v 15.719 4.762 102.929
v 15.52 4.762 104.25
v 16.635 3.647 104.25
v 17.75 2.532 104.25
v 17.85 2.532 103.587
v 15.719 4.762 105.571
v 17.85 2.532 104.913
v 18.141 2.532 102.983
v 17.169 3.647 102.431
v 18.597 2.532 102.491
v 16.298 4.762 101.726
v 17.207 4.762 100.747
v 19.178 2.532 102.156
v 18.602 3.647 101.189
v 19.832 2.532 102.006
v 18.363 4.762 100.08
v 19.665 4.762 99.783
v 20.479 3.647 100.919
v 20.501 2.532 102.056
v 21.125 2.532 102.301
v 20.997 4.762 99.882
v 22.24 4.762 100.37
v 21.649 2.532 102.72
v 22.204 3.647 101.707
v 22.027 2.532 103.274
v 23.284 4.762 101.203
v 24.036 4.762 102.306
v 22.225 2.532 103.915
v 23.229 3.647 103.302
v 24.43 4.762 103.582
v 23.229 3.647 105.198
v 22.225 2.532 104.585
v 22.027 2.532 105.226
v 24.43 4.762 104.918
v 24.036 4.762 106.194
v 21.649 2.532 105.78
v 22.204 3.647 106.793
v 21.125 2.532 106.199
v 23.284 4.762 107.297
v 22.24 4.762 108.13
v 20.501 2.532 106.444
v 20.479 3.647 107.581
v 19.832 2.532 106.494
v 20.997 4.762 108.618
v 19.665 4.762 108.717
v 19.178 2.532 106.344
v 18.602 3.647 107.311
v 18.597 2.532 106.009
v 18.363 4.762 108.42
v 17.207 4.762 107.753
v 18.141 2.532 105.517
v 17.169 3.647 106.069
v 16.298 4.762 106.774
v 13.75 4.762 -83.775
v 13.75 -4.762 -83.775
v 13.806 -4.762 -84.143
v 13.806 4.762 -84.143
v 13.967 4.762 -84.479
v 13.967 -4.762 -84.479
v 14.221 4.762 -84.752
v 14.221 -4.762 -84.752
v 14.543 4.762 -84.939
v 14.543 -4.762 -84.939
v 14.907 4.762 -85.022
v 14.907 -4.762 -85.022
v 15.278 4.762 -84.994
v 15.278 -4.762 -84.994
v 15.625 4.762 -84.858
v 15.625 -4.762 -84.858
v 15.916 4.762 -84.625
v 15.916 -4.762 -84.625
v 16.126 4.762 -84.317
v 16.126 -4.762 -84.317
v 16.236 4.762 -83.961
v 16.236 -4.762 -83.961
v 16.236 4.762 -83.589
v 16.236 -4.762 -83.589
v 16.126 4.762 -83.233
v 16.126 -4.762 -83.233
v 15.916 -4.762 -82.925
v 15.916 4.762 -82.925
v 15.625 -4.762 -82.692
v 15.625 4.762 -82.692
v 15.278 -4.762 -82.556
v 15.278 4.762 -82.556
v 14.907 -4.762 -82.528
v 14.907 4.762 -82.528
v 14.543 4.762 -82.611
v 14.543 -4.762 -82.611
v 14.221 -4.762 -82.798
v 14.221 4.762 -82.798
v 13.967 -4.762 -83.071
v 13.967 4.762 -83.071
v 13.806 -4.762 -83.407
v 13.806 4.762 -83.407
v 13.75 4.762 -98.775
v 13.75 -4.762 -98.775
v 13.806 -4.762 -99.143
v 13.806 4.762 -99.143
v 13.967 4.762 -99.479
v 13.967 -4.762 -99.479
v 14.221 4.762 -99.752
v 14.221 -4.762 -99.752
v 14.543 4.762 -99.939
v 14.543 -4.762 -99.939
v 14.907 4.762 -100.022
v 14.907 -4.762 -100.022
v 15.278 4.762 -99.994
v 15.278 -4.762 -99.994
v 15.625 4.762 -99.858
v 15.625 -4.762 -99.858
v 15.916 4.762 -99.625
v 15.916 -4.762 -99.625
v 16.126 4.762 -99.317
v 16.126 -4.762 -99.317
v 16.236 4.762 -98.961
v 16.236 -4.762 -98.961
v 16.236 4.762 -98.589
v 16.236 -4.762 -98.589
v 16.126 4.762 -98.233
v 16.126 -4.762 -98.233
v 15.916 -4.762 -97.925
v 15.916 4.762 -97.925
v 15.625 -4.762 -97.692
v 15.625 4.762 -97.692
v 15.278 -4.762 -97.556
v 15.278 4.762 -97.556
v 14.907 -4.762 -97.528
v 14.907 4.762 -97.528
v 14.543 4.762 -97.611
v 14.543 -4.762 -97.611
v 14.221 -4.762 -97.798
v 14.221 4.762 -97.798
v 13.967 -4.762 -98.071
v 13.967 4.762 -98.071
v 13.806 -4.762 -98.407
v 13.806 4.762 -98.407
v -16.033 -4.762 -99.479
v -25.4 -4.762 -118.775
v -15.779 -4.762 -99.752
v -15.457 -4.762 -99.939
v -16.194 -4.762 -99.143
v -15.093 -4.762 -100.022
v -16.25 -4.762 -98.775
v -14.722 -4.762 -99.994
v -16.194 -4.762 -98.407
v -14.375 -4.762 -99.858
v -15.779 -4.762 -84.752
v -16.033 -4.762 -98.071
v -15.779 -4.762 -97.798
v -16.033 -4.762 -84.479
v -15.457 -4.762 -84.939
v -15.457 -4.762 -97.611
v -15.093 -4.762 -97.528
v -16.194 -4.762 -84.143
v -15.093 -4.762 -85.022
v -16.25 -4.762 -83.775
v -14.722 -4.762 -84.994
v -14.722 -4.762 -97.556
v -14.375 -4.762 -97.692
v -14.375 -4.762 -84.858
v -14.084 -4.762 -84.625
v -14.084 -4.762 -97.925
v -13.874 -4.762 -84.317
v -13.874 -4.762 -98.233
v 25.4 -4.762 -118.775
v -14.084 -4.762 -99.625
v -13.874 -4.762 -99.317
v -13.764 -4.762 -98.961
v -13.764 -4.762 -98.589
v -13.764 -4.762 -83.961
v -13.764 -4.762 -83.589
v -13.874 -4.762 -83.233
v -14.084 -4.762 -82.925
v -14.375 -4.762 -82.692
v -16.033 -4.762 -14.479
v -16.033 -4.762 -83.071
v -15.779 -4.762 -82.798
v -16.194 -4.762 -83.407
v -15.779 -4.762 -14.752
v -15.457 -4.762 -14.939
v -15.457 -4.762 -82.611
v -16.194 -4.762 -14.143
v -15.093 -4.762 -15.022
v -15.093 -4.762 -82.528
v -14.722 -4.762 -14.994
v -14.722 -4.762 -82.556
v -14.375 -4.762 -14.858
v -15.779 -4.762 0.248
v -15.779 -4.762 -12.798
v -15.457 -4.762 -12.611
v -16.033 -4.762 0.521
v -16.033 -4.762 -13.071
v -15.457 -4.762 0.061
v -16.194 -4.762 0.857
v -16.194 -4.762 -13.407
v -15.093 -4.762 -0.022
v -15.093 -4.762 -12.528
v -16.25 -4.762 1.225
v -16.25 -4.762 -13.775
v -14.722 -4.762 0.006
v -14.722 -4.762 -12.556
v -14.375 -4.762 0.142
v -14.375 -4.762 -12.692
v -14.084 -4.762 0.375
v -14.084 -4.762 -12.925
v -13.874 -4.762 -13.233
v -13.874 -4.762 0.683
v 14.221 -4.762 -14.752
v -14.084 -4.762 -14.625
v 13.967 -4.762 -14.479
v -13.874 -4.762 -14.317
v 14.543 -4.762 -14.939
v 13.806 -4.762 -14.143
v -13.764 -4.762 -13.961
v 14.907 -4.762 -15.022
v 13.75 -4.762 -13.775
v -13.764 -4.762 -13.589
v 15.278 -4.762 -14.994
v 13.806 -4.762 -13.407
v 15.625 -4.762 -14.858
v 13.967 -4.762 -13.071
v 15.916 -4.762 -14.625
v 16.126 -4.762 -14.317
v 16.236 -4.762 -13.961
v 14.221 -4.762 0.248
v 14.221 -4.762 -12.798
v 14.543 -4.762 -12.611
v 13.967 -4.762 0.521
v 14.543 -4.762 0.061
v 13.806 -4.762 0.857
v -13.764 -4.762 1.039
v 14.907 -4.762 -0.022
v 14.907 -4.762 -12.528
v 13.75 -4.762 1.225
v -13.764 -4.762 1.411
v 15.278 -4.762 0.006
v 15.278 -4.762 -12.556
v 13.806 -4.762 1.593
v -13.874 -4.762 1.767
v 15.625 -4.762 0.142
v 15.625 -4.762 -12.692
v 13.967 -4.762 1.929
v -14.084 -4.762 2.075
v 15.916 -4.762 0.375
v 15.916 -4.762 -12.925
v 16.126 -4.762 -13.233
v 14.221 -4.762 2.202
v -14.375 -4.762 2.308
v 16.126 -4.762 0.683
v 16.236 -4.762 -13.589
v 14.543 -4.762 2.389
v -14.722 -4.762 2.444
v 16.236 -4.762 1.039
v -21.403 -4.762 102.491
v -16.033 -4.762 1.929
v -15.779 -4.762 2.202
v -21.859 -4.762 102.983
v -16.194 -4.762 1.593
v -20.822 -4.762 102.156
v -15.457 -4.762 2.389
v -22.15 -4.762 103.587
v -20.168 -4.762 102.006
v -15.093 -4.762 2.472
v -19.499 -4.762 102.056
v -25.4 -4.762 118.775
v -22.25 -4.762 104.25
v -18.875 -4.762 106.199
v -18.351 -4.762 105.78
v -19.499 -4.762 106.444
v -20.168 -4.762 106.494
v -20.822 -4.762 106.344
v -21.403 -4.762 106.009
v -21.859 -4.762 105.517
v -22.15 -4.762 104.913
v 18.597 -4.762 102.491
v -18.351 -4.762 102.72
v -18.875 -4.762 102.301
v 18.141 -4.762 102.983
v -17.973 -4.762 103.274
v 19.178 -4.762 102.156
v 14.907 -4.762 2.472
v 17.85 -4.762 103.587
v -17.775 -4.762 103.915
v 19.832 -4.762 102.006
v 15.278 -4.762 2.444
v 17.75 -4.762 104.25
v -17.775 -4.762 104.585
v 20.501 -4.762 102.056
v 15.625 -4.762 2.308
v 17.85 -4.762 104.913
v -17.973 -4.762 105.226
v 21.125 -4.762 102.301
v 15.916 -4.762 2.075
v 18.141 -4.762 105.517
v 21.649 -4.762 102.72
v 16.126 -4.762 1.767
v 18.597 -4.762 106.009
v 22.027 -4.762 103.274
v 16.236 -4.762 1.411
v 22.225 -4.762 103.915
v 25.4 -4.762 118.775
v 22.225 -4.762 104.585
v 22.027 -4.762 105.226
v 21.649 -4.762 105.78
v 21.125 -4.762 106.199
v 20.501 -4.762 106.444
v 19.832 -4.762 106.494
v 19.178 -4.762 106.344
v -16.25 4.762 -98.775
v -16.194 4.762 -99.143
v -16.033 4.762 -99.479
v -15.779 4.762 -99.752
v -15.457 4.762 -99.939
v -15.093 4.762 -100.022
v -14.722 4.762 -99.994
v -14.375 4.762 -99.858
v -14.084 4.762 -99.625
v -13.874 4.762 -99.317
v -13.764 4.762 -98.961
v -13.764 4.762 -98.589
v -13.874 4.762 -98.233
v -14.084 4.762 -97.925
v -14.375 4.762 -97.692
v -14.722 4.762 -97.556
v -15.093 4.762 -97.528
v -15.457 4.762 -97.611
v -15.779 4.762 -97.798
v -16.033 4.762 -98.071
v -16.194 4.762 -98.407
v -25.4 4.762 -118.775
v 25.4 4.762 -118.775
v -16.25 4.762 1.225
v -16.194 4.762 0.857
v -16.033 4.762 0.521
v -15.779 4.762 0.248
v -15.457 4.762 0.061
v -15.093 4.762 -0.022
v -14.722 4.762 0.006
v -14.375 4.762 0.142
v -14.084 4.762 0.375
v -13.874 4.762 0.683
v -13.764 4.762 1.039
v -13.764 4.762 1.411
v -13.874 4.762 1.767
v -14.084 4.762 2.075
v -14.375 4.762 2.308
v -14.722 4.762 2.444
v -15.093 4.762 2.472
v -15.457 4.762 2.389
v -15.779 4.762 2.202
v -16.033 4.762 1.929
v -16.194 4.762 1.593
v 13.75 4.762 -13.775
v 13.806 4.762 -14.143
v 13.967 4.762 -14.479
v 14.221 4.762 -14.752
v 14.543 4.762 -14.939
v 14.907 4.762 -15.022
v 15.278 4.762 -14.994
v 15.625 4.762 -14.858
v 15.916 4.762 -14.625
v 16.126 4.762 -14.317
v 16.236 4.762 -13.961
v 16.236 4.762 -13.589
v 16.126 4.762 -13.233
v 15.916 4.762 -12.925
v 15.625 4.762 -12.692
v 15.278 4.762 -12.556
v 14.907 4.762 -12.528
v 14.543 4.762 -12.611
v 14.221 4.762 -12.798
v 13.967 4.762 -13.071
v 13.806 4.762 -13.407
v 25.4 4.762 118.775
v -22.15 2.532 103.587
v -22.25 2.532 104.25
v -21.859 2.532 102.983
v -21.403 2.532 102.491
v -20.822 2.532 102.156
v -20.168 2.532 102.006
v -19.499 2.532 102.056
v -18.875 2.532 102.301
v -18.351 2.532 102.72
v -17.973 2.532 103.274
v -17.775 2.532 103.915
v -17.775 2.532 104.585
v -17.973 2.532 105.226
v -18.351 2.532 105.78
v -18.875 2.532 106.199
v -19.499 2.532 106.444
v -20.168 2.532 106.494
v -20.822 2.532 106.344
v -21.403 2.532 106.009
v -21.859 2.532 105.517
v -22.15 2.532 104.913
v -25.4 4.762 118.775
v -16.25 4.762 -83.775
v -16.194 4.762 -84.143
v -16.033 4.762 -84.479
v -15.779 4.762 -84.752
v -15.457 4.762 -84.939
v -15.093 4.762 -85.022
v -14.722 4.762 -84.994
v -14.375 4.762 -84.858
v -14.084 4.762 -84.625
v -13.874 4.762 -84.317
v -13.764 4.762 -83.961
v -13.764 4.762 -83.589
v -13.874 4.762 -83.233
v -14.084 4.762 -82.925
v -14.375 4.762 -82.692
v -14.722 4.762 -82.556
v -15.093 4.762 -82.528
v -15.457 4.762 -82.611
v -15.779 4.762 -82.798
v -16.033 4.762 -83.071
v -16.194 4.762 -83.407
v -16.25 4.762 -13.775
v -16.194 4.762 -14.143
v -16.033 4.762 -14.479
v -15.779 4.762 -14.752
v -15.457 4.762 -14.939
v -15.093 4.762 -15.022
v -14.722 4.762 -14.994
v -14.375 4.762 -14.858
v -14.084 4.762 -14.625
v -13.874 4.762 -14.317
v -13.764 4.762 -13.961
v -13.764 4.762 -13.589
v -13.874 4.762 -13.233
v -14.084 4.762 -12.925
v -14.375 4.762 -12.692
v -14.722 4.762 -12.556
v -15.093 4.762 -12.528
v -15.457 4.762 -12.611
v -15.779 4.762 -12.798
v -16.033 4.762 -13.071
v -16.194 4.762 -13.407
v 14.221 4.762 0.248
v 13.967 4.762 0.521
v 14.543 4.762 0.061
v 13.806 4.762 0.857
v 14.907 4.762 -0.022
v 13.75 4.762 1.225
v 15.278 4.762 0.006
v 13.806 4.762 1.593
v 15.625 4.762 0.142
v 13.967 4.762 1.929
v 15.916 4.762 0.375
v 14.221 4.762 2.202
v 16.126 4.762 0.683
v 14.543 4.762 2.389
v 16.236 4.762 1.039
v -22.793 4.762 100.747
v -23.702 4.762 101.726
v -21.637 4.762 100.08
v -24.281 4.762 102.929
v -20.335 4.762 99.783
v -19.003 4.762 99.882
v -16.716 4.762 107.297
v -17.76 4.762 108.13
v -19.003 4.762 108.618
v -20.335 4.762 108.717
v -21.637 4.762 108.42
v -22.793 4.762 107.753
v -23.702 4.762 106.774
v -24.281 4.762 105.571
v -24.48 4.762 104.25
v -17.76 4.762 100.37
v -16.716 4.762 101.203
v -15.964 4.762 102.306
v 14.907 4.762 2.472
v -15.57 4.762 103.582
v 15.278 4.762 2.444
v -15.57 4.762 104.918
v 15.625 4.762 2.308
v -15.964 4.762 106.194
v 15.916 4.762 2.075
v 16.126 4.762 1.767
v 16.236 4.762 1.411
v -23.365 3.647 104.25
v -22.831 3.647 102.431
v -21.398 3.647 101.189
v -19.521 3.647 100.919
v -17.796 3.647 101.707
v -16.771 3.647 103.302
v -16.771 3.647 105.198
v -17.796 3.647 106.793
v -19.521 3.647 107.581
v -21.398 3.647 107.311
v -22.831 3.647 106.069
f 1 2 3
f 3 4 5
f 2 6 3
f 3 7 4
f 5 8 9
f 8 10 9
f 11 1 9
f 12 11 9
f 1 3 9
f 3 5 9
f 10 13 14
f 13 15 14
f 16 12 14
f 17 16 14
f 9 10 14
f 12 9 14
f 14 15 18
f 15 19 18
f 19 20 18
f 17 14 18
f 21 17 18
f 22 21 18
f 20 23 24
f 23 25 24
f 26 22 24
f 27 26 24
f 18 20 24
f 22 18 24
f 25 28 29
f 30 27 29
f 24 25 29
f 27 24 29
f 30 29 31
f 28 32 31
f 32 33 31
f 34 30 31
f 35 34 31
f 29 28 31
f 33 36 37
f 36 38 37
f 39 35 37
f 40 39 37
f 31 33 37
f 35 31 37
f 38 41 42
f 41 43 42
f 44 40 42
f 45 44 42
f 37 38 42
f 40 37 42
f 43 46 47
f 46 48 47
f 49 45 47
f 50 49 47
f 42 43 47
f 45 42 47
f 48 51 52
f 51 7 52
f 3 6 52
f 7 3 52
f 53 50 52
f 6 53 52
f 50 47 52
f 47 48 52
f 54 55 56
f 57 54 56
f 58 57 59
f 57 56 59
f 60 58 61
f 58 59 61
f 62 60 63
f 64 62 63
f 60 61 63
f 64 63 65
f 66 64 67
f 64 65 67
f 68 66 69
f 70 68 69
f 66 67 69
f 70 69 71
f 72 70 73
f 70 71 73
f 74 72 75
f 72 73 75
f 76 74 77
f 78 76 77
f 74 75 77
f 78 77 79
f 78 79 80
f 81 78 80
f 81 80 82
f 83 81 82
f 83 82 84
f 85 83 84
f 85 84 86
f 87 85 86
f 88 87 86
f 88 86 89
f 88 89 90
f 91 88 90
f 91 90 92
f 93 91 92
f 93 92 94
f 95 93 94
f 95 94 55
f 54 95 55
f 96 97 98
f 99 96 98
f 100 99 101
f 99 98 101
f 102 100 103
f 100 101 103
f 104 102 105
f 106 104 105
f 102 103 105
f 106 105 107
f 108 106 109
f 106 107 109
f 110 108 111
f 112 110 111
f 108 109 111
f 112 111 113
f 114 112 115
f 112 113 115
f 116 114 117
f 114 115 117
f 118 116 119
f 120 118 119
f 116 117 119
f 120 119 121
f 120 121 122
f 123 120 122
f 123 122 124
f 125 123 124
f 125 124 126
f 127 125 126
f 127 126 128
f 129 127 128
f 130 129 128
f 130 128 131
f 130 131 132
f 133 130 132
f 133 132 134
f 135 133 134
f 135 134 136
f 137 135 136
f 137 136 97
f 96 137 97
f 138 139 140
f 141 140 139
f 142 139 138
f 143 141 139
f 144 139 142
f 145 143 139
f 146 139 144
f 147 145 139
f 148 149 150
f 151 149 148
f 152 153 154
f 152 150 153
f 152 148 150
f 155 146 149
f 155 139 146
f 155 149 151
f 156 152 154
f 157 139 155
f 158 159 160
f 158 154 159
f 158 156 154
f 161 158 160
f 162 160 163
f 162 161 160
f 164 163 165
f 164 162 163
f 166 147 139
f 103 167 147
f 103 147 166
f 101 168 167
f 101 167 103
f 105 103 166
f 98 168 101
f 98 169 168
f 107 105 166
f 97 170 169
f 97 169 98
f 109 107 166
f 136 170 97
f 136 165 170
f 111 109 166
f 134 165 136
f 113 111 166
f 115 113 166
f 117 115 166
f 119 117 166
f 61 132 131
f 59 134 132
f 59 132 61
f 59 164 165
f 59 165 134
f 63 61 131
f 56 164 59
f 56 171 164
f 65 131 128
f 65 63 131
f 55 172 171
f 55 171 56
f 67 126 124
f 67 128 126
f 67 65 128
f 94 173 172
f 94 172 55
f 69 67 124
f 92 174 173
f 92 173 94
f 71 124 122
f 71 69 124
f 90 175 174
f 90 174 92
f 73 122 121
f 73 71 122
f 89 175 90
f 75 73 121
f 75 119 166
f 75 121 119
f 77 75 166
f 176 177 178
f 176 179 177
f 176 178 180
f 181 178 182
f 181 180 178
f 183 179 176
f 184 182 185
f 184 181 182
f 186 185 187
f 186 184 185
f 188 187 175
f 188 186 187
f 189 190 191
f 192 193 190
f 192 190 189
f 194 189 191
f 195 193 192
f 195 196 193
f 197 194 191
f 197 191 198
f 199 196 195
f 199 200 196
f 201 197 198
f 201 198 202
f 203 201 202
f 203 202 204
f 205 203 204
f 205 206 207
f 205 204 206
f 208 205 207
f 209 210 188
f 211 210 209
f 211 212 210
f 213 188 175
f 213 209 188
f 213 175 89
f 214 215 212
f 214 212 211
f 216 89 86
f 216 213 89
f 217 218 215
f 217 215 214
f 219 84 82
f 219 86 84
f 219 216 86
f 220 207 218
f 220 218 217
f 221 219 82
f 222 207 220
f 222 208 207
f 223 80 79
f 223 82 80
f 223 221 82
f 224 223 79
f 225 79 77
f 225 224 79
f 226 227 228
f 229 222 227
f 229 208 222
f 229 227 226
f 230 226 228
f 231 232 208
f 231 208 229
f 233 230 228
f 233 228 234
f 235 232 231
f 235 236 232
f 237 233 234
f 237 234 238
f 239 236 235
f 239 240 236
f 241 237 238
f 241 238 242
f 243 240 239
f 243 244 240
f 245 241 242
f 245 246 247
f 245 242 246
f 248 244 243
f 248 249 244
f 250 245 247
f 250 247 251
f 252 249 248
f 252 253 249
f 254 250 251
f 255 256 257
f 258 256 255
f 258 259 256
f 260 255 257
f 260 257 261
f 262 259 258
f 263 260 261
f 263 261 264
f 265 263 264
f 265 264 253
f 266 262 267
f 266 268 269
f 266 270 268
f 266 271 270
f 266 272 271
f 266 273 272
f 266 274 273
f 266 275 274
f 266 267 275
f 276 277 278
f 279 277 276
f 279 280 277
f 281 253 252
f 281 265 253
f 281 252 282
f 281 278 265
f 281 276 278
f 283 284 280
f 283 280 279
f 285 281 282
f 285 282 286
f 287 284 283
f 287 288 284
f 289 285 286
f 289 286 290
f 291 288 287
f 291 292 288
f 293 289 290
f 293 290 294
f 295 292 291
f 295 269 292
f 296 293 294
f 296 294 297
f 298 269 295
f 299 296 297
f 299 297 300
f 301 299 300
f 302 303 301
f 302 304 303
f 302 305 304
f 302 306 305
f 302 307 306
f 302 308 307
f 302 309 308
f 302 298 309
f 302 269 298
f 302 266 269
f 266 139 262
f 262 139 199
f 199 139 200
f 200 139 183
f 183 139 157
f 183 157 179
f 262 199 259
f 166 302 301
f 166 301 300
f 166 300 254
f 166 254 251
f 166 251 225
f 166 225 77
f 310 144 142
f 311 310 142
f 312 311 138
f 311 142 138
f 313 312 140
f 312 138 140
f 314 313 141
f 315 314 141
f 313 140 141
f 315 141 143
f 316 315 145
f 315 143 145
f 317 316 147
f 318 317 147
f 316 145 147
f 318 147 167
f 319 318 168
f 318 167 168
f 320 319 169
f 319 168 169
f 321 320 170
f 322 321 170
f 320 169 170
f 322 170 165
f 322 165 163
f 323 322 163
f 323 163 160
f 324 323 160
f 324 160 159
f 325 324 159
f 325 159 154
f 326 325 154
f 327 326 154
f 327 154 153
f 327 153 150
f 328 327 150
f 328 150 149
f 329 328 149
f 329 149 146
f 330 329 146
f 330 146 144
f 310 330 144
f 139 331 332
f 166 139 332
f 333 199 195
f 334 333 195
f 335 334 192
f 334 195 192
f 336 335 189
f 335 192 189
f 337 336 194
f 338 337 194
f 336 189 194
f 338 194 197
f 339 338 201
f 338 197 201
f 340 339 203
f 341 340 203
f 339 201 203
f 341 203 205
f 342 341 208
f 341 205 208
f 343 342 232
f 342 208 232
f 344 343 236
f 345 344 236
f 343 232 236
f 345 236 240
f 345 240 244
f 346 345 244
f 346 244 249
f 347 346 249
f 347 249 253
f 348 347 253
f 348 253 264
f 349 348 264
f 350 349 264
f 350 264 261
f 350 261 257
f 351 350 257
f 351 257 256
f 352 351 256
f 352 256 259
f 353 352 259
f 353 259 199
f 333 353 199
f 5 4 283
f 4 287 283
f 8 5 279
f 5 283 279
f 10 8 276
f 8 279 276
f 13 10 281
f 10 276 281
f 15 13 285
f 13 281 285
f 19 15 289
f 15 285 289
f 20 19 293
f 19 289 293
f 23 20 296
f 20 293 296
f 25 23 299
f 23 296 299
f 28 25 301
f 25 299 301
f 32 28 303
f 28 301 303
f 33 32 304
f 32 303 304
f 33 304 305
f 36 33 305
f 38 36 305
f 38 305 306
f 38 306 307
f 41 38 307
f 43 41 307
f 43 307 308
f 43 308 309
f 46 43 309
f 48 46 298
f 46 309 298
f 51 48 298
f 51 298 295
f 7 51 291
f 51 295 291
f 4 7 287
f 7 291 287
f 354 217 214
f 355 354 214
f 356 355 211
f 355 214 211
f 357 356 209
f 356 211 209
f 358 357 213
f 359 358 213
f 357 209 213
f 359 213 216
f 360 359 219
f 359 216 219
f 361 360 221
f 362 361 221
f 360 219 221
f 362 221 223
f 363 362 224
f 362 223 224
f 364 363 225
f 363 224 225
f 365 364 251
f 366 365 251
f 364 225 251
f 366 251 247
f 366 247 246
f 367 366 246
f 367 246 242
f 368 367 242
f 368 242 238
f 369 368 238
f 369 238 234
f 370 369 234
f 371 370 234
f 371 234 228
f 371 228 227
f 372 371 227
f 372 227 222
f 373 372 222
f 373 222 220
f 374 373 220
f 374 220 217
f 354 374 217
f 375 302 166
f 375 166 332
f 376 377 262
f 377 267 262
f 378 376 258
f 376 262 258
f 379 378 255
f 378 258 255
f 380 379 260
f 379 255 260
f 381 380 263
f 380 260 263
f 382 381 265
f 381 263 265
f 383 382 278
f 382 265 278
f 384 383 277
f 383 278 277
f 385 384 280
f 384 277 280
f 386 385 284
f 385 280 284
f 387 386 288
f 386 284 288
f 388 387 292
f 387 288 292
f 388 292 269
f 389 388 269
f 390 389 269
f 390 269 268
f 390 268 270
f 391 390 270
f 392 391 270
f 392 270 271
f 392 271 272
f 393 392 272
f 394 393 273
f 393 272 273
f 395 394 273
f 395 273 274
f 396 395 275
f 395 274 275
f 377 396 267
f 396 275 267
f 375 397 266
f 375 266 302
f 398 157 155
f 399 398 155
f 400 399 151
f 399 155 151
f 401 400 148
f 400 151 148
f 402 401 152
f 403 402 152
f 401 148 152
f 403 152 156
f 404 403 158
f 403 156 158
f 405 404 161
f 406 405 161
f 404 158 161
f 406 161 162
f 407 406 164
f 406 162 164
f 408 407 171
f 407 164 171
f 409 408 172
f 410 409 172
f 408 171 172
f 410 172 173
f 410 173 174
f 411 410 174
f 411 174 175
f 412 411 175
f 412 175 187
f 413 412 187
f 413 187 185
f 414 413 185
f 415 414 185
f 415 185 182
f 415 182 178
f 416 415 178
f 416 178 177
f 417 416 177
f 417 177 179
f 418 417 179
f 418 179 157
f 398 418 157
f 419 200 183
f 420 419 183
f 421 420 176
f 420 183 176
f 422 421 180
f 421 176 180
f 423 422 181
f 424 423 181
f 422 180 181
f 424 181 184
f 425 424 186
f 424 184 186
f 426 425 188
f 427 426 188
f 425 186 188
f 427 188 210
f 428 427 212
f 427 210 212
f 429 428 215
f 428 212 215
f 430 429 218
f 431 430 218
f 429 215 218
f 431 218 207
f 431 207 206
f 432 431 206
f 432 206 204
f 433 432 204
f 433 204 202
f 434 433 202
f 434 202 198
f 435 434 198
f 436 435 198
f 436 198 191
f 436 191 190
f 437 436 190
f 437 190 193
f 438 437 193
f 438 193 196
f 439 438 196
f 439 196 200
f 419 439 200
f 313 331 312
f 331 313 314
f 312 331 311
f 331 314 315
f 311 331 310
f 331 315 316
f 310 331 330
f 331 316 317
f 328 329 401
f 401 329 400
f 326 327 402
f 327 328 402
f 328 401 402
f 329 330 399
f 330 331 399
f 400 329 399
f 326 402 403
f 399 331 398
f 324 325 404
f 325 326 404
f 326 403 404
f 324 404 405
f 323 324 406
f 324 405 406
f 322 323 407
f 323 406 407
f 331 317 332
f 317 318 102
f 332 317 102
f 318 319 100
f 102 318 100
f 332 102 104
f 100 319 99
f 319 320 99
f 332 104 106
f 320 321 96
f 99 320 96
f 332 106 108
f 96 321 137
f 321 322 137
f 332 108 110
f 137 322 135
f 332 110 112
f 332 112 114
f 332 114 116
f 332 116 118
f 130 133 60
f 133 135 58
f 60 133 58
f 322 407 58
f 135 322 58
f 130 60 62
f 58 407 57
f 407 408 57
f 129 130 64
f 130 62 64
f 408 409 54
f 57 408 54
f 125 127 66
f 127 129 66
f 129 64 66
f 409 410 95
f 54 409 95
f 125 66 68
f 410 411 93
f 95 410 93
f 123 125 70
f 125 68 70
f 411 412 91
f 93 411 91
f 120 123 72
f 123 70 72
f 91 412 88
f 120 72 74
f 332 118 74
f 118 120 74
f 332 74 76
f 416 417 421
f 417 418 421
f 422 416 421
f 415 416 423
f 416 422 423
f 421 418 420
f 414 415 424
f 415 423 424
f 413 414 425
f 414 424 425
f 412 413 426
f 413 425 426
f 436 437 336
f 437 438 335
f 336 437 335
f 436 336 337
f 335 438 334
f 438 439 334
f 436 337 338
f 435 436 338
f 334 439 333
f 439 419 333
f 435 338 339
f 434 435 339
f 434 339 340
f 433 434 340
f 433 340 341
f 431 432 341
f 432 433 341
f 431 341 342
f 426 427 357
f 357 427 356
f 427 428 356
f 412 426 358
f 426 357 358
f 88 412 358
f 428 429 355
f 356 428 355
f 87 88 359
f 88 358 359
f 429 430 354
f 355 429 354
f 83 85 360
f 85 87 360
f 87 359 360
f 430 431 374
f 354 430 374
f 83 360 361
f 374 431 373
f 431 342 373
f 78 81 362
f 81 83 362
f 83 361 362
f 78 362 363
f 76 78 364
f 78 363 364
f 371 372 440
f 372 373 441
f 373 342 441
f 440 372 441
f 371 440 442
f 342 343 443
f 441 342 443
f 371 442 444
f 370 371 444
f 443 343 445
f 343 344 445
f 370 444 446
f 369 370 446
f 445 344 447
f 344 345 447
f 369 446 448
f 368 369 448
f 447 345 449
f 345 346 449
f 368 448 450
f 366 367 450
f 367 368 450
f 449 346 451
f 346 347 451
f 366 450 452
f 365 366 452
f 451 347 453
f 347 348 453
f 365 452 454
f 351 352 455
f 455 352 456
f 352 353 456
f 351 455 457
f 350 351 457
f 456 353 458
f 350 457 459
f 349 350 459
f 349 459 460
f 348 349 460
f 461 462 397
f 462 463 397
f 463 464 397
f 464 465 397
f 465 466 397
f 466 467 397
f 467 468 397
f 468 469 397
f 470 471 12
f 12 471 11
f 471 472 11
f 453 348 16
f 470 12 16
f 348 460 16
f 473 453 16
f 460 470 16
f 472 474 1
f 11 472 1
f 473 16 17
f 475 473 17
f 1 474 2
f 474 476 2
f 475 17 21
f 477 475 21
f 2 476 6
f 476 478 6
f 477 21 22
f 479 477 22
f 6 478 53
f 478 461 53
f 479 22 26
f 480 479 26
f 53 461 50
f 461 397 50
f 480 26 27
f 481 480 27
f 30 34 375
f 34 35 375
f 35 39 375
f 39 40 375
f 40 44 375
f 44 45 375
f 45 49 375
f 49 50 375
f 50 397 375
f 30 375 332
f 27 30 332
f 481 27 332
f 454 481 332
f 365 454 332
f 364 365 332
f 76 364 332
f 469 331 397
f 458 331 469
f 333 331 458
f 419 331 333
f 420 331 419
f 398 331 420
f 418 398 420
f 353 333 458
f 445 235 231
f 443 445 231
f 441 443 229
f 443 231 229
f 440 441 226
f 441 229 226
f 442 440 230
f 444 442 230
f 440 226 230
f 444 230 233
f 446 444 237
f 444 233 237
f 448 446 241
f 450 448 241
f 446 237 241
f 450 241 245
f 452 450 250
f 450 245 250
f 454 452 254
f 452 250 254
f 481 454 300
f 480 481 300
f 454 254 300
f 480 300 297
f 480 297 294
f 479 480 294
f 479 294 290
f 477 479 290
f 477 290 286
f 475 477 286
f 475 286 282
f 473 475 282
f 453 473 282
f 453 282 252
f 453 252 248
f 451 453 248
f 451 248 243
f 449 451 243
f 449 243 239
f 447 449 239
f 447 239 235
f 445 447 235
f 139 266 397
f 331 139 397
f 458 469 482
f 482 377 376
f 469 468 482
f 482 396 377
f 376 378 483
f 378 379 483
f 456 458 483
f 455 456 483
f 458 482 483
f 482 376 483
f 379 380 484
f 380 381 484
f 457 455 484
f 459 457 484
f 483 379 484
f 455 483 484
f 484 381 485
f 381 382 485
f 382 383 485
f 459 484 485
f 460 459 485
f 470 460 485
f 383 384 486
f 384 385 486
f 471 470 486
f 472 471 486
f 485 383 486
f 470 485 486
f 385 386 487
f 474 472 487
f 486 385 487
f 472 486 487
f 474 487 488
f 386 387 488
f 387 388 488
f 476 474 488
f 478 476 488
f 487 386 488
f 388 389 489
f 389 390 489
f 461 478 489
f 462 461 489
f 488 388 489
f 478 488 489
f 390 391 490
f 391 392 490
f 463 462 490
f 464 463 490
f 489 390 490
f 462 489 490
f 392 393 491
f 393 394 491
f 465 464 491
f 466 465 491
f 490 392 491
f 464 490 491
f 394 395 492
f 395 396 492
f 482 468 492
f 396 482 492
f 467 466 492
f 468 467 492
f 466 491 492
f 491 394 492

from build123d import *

# Parameters (mm, degrees)
SKETCH1_W                     = 50.8
SKETCH1_H                     = 9.525
BOSS_EXTRUDE1_DEPTH           = 118.775
TAP_DRILL_FOR_M3X0_5_TAP1_D   = 2.5
CSK_FOR_M4_SFHCS1_D           = 4.5
CSK_FOR_M4_SFHCS1_CSINK_D     = 8.96
CSK_FOR_M4_SFHCS1_CSINK_ANGLE = 90


with BuildPart() as part:
    # Sketch1 → Boss-Extrude1 (new, symmetric)
    with BuildSketch(Plane.XY):
        Rectangle(SKETCH1_W, SKETCH1_H)
    extrude(amount=BOSS_EXTRUDE1_DEPTH, both=True)

    # Tap Drill for M3x0.5 Tap1 (through all)
    with Locations(Plane(origin=(0, 4.7625, 0), x_dir=(1, 0, 0), z_dir=(0, 1, 0))):
        with Locations((-15, 98.775), (15, 98.775), (-15, 83.775), (15, 83.775), (15, 13.775), (-15, 13.775), (15, -1.225), (-15, -1.225)):
            Hole(TAP_DRILL_FOR_M3X0_5_TAP1_D / 2)

    # CSK for M4 SFHCS1 (through all)
    with Locations(Plane(origin=(0, 4.7625, 0), x_dir=(1, 0, 0), z_dir=(0, 1, 0))):
        with Locations((-20, -104.25), (20, -104.25)):
            CounterSinkHole(CSK_FOR_M4_SFHCS1_D / 2, CSK_FOR_M4_SFHCS1_CSINK_D / 2, counter_sink_angle=CSK_FOR_M4_SFHCS1_CSINK_ANGLE)


solid = part.part
